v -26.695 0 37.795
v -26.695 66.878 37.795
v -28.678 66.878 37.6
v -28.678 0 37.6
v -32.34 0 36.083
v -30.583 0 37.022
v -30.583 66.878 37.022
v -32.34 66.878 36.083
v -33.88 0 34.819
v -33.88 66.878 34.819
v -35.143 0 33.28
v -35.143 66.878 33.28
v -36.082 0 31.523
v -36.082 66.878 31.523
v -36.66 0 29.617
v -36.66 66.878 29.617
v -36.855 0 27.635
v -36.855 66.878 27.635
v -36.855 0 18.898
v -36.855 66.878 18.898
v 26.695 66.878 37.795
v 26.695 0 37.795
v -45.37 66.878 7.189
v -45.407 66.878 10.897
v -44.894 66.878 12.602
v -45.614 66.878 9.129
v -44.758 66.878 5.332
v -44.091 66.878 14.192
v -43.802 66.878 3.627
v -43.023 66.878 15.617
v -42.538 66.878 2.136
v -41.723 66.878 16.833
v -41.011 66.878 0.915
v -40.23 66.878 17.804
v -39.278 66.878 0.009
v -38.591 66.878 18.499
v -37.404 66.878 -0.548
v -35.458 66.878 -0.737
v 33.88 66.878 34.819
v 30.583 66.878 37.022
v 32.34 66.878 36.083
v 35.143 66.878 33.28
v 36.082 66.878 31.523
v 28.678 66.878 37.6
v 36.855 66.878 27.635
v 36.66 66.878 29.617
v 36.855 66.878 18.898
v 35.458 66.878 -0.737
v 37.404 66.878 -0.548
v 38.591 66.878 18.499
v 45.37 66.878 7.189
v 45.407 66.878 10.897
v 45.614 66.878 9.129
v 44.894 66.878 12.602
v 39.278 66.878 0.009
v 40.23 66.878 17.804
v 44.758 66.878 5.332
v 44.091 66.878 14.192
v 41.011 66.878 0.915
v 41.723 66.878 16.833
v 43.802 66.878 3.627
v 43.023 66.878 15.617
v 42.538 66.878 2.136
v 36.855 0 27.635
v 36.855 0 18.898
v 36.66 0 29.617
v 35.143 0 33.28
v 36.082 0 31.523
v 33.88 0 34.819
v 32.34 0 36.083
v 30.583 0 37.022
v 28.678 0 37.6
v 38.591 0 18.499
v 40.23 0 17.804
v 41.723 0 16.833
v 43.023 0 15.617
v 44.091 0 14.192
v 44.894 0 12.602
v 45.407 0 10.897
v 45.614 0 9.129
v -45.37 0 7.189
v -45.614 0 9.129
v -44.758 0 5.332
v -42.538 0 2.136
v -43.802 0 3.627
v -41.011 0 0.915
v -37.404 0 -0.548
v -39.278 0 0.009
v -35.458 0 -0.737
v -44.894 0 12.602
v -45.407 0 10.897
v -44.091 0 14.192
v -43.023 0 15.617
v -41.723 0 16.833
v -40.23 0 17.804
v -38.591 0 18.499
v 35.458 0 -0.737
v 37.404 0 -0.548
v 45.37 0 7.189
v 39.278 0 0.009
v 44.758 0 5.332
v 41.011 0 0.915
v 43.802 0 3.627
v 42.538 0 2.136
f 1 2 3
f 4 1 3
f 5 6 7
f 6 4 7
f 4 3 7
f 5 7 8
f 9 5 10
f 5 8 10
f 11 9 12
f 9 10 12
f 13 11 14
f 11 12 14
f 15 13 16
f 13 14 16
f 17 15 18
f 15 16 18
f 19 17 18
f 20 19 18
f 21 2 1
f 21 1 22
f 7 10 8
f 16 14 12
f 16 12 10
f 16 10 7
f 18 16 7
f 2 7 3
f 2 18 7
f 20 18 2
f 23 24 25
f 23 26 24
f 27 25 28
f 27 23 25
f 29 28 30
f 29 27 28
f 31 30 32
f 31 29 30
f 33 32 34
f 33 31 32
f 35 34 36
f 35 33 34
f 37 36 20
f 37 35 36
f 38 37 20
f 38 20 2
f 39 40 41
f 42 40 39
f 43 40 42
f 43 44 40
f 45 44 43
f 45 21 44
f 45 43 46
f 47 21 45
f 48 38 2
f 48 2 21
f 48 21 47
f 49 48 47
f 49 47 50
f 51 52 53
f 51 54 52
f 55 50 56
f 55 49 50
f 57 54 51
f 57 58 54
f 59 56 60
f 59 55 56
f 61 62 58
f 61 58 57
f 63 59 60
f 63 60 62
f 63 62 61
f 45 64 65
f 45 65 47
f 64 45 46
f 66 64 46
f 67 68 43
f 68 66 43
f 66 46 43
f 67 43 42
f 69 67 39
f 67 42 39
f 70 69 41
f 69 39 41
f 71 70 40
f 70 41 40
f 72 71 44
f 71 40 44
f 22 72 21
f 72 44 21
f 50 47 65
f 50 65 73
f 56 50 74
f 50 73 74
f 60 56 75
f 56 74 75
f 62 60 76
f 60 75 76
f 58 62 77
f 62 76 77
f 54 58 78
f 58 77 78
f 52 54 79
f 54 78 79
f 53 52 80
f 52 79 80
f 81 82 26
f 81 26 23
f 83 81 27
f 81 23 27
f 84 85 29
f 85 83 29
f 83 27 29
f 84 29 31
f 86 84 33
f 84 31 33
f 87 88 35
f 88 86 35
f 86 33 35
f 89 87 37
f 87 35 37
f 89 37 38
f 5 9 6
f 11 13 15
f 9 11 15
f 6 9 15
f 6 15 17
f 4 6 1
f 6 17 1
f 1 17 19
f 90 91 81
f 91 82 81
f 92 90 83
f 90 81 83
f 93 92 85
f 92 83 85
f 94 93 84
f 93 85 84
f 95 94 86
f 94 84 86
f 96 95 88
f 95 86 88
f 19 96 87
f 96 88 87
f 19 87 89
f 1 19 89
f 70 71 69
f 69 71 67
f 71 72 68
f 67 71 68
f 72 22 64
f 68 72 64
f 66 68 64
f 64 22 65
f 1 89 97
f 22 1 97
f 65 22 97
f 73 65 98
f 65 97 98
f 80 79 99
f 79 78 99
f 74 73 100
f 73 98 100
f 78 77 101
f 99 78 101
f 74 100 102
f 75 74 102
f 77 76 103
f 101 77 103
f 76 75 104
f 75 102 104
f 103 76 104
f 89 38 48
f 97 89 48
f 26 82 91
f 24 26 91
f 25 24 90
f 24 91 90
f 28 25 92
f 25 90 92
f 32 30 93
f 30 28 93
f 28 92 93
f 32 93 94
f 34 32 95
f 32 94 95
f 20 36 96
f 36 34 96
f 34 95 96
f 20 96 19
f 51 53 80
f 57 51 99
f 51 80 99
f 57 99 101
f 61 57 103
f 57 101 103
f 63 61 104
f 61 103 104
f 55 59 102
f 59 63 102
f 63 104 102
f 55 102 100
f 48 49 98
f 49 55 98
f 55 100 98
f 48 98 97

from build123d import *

# Parameters (mm, degrees)
SKETCH1_W           = 91.2368
SKETCH1_H           = 66.8782
BASE_FLANGE1_DEPTH  = 0.7366
SKETCH6_W           = 91.2368
SKETCH6_H           = 66.8782
BOSS_EXTRUDE1_DEPTH = 37.7952
SKETCH8_W           = 8.763
SKETCH8_H           = 66.8782
CUT_EXTRUDE2_DEPTH  = 18.8976
FILLET1_R           = 10.16


# Sheet-metal steps are written as plain solids
with BuildPart() as part:
    # Sketch1 → Base-Flange1 (new body)
    with BuildSketch(Plane.XY):
        with Locations((0, 33.4391)):
            Rectangle(SKETCH1_W, SKETCH1_H)
    extrude(amount=-BASE_FLANGE1_DEPTH)

    # Sketch6 → Boss-Extrude1 (add)
    with BuildSketch(Plane.XY):
        with Locations((0, 33.4391)):
            Rectangle(SKETCH6_W, SKETCH6_H)
    extrude(amount=BOSS_EXTRUDE1_DEPTH)

    # Sketch8 → Cut-Extrude2 (cut)
    with BuildSketch(Plane.XY.offset(37.7952)):
        with Locations((-41.2369, 33.4391)):
            Rectangle(SKETCH8_W, SKETCH8_H)
    cut_extrude2 = extrude(amount=-CUT_EXTRUDE2_DEPTH, mode=Mode.SUBTRACT)

    # Mirror1: Cut-Extrude2 across plane
    add(cut_extrude2.mirror(Plane(origin=(0, 0, 0), x_dir=(0, 0, 1), z_dir=(1, 0, 0))), mode=Mode.SUBTRACT)

    # Fillet1
    # the kernel refuses this fillet: 10.16 mm, written as the material it takes off along each edge
    with BuildSketch(Plane(origin=(-45.6184, -25.158744876, 18.8976), x_dir=(1, 0, 0), z_dir=(0, 1, 0))) as fillet1_piece_1:
        with BuildLine():
            CenterArc((10.16, 10.063497951), FILLET1_R, 180, 82.096792267)
            Line((0, 10.063497951), (-0.2032, 10.063497951))
            Line((-0.2032, 10.063497951), (-0.2032, 0))
            Line((-0.2032, 0), (0, -0.2032))
            ThreePointArc((0, -0.2032), (4.3815, -0.2032), (8.73506, -0.201269959))
            Line((8.73506, -0.201269959), (8.763, 0))
        make_face()
    extrude(amount=117.195689753, mode=Mode.SUBTRACT)
    with BuildSketch(Plane(origin=(45.6184, -25.158744876, 18.8976), x_dir=(-1, 0, 0), z_dir=(0, 1, 0))) as fillet1_piece_2:
        with BuildLine():
            CenterArc((10.16, -10.063497951), FILLET1_R, 97.903207733, 82.096792267)
            Line((0, -10.063497951), (-0.2032, -10.063497951))
            Line((-0.2032, -10.063497951), (-0.2032, 0))
            Line((-0.2032, 0), (0, 0.2032))
            ThreePointArc((0, 0.2032), (4.3815, 0.2032), (8.73506, 0.201269959))
            Line((8.73506, 0.201269959), (8.763, 0))
        make_face()
    extrude(amount=117.195689753, mode=Mode.SUBTRACT)
    with BuildSketch(Plane(origin=(36.8554, 92.2782, 37.7952), x_dir=(-1, 0, 0), z_dir=(0, -1, 0)), Plane(origin=(-36.8554, 92.2782, 37.7952), x_dir=(0, 0, -1), z_dir=(0, -1, 0)), Plane(origin=(-45.6184, 92.2782, -0.7366), x_dir=(1, 0, 0), z_dir=(0, -1, 0))) as fillet1_piece_3:
        with BuildLine():
            CenterArc((FILLET1_R, FILLET1_R), FILLET1_R, 180, 90)
            Line((0, FILLET1_R), (-FILLET1_R * 0.02, FILLET1_R))
            Line((-FILLET1_R * 0.02, FILLET1_R), (-FILLET1_R * 0.02, -FILLET1_R * 0.02))
            Line((-FILLET1_R * 0.02, -FILLET1_R * 0.02), (FILLET1_R, -FILLET1_R * 0.02))
            Line((FILLET1_R, -FILLET1_R * 0.02), (FILLET1_R, 0))
        make_face()
    extrude(amount=117.6782, mode=Mode.SUBTRACT)
    with BuildSketch(Plane(origin=(45.6184, -25.4, -0.7366), x_dir=(0, 0, 1), z_dir=(0, 1, 0))) as fillet1_piece_4:
        with BuildLine():
            CenterArc((FILLET1_R, -FILLET1_R), FILLET1_R, 90, 90)
            Line((0, -FILLET1_R), (-FILLET1_R * 0.02, -FILLET1_R))
            Line((-FILLET1_R * 0.02, -FILLET1_R), (-FILLET1_R * 0.02, FILLET1_R * 0.02))
            Line((-FILLET1_R * 0.02, FILLET1_R * 0.02), (FILLET1_R, FILLET1_R * 0.02))
            Line((FILLET1_R, FILLET1_R * 0.02), (FILLET1_R, 0))
        make_face()
    extrude(amount=117.6782, mode=Mode.SUBTRACT)


solid = part.part
